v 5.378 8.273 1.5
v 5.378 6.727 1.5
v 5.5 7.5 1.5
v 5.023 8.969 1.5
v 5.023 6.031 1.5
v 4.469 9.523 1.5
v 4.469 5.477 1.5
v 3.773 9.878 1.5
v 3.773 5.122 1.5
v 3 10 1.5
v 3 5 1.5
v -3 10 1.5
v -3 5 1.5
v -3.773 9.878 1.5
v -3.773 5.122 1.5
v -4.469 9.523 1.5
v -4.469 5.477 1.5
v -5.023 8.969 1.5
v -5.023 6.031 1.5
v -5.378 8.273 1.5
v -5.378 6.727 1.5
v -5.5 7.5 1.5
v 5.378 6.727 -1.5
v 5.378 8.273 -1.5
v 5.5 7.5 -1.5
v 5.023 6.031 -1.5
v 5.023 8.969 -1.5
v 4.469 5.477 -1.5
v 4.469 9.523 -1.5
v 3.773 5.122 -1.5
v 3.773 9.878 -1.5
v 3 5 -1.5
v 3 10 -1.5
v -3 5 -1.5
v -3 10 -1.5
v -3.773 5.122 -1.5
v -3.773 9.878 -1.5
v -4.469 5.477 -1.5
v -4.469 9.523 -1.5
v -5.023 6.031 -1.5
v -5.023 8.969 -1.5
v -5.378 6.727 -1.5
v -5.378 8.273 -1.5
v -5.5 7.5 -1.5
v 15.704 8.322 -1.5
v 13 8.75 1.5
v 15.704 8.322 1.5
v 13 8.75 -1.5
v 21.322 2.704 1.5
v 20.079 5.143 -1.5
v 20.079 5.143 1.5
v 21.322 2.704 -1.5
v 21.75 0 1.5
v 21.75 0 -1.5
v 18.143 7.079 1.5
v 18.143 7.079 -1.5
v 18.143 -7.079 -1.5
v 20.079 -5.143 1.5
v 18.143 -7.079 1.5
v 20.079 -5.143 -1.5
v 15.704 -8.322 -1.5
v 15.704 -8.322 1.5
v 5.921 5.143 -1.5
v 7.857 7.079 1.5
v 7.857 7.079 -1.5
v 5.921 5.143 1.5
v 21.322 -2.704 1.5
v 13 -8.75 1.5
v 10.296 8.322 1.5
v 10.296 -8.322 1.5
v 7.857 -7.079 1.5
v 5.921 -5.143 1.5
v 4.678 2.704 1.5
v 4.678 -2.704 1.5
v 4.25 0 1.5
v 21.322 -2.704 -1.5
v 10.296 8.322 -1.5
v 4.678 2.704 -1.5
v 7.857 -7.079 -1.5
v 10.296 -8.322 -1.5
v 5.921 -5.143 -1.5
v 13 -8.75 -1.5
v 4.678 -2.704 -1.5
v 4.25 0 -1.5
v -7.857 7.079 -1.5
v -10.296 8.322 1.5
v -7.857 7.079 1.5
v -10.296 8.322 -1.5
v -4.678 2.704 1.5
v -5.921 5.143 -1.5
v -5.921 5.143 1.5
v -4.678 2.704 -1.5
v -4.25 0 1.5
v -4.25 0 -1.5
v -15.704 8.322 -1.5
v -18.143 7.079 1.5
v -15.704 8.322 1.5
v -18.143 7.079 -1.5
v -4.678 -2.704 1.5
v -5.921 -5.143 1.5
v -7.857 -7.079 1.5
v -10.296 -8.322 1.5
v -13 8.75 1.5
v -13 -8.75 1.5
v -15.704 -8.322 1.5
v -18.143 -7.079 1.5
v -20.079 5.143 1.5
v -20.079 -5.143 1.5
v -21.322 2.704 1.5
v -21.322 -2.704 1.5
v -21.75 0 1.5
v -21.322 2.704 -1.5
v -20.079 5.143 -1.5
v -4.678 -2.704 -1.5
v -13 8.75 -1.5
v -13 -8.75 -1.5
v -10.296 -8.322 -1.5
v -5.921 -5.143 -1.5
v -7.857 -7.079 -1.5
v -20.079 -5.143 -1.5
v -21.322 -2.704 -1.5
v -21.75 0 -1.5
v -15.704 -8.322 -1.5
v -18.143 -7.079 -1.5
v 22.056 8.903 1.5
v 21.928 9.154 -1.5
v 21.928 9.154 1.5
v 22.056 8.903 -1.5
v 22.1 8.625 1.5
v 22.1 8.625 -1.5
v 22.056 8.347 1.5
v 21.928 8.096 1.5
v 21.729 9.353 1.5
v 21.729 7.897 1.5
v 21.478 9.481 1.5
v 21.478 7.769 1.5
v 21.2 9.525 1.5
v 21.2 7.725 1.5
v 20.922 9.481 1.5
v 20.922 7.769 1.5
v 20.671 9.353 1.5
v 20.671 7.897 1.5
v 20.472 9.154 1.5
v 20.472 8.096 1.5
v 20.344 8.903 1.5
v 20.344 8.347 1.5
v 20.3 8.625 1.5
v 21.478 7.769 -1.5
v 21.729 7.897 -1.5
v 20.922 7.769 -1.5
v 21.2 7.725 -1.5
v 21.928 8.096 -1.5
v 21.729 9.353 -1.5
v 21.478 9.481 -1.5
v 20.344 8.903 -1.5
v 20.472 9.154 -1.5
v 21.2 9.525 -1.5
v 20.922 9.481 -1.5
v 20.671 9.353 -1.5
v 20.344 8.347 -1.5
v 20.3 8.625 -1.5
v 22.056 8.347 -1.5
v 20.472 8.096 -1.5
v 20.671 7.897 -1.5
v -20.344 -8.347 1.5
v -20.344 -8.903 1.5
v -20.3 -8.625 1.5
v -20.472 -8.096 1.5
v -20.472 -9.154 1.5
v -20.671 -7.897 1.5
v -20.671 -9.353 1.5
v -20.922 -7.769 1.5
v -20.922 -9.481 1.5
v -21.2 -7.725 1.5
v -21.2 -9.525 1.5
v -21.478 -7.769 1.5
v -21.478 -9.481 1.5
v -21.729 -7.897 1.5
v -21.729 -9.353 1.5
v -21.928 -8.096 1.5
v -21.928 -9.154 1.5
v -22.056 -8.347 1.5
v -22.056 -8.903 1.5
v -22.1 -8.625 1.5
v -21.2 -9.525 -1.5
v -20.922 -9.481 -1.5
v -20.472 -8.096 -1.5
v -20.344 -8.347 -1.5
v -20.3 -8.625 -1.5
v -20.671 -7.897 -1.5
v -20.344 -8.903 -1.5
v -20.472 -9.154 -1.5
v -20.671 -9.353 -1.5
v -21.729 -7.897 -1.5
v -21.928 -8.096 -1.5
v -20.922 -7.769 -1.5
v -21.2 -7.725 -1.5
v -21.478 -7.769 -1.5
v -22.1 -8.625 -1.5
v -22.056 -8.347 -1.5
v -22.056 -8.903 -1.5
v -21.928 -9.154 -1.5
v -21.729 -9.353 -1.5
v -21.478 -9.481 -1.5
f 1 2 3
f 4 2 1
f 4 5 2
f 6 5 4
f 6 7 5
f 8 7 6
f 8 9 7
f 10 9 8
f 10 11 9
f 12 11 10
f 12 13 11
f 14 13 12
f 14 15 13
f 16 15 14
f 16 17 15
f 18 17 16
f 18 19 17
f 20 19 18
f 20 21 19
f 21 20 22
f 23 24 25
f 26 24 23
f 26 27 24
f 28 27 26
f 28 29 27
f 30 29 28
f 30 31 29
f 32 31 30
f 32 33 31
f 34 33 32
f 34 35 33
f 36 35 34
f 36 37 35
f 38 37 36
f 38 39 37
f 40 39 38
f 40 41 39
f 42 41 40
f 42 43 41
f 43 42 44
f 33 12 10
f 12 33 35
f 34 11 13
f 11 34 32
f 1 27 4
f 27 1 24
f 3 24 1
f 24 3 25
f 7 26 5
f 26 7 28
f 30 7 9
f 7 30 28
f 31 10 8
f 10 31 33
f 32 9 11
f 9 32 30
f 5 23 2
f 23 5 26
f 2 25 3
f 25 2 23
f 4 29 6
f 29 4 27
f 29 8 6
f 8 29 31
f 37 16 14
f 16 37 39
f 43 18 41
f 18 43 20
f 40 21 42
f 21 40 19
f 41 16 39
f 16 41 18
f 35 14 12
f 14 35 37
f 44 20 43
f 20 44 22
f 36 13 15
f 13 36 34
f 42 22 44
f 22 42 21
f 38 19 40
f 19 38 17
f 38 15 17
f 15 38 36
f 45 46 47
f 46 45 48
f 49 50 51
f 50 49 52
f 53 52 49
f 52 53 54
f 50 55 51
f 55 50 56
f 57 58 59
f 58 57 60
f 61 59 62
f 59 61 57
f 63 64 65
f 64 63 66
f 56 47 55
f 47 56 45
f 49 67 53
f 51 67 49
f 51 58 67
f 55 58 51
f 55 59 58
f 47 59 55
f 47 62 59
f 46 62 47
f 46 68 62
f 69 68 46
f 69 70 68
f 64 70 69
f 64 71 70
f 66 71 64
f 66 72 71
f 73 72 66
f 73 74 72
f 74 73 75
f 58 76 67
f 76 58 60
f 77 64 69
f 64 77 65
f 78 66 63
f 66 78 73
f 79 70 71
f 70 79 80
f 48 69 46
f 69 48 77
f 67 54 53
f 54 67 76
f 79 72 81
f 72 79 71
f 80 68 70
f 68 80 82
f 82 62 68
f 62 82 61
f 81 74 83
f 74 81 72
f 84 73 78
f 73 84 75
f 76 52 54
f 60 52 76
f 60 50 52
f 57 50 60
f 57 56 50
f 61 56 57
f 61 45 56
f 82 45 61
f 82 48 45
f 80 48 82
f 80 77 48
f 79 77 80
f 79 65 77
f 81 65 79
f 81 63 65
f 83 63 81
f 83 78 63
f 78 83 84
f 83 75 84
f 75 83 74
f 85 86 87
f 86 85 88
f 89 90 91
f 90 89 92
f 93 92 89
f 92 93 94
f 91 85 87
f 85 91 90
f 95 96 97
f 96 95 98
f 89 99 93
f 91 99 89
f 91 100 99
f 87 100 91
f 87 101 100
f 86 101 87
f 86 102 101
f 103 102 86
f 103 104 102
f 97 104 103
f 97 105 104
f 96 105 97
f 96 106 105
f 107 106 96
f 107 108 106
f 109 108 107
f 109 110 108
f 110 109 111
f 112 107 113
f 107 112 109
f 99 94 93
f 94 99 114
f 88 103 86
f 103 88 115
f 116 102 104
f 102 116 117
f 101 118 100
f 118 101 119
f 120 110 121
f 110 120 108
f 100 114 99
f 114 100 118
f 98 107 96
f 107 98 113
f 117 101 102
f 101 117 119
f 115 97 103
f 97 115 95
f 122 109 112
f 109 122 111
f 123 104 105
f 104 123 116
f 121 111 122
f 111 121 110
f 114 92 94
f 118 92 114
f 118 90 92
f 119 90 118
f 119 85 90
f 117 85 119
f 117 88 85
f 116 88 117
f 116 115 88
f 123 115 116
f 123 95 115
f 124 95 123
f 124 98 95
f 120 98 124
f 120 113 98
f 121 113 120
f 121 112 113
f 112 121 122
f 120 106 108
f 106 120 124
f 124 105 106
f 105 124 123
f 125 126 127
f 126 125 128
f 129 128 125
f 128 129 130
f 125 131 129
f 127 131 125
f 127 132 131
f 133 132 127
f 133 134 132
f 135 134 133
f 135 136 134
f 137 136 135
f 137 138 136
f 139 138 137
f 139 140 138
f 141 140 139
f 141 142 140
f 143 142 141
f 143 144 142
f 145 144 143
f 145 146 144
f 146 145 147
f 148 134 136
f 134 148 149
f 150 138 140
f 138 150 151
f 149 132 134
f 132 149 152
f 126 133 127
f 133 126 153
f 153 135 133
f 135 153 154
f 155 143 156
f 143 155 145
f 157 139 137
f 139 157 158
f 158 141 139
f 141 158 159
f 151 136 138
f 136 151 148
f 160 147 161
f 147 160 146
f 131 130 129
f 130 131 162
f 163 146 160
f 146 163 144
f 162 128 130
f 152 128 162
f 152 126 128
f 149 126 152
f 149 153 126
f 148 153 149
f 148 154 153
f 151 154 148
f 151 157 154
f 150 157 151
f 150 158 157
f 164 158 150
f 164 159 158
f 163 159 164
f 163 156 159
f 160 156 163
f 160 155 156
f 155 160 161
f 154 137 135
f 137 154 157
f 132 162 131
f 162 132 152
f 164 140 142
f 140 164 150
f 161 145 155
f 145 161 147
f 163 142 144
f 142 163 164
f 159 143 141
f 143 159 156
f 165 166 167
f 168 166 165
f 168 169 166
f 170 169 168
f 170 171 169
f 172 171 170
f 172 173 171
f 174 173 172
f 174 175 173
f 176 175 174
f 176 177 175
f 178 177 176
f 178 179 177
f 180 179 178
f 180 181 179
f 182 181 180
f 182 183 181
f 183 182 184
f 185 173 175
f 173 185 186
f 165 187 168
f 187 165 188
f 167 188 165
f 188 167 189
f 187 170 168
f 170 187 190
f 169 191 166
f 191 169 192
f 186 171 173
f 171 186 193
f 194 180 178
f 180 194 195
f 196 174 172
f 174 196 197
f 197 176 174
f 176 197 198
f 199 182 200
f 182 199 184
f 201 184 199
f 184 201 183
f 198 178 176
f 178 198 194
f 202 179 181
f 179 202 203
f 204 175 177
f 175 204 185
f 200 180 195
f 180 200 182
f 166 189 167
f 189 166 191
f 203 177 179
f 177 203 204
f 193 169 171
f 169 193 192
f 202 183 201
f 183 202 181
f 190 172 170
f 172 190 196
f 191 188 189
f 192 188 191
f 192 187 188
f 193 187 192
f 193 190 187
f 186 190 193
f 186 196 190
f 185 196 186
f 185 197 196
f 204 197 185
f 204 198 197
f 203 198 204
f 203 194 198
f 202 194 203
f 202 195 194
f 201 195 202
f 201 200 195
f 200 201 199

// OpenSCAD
transducerOffset = 26;
transducerRadius = 8.75;
screwRadius = 1.5;
screwHorizontalOffset = 40;
screwVerticalOffset = 15;

altScrewRadius = 0.9;
altScrewHorizontalOffset = 42.4;
altScrewVerticalOffset = 17.25;

crystalWidth = 11;
crystalHeight = 5;
crystalDistanceFromCenter = 7.5;

$fn = 20;
module distanceSensorFootPrint(thickness){
// Transducer holes
	translate([transducerOffset/2, 0, 0]){
		cylinder(thickness, transducerRadius, transducerRadius, center = true);
	}
	translate([-transducerOffset/2, 0, 0]){
		cylinder(thickness, transducerRadius, transducerRadius, center = true);
	}
	
	translate([0, crystalDistanceFromCenter, 0]){
		crystalCutout(crystalWidth, crystalHeight, thickness);
	}

// Screw holes with dimensions found online
//	translate([-screwHorizontalOffset/2, -screwVerticalOffset/2, 0]){
//		cylinder(thickness, screwRadius, screwRadius, center = true);
//	}
//	translate([screwHorizontalOffset/2, screwVerticalOffset/2, 0]){
//		cylinder(thickness, screwRadius, screwRadius, center = true);
//	}


// Screw holes with measured dimensions
	translate([altScrewHorizontalOffset/2, altScrewVerticalOffset/2, 0]){
		cylinder(thickness, altScrewRadius, altScrewRadius, center = true);
	}
//	translate([altScrewHorizontalOffset/2, -altScrewVerticalOffset/2, 0]){
//		cylinder(thickness, altScrewRadius, altScrewRadius, center = true);
//	}
//	translate([-altScrewHorizontalOffset/2, altScrewVerticalOffset/2, 0]){
//		cylinder(thickness, altScrewRadius, altScrewRadius, center = true);
//	}
	translate([-altScrewHorizontalOffset/2, -altScrewVerticalOffset/2, 0]){
		cylinder(thickness, altScrewRadius, altScrewRadius, center = true);
	}
}

module crystalCutout(width, height, depth){
	cube([width-height, height, depth], center = true);
	translate([(width/2)-height/2,0,0]){
		cylinder(depth, height/2, height/2, center = true);
	}
	translate([-((width/2)-height/2),0,0]){
		cylinder(depth, height/2, height/2, center = true);
	}
}

distanceSensorFootPrint(3);
